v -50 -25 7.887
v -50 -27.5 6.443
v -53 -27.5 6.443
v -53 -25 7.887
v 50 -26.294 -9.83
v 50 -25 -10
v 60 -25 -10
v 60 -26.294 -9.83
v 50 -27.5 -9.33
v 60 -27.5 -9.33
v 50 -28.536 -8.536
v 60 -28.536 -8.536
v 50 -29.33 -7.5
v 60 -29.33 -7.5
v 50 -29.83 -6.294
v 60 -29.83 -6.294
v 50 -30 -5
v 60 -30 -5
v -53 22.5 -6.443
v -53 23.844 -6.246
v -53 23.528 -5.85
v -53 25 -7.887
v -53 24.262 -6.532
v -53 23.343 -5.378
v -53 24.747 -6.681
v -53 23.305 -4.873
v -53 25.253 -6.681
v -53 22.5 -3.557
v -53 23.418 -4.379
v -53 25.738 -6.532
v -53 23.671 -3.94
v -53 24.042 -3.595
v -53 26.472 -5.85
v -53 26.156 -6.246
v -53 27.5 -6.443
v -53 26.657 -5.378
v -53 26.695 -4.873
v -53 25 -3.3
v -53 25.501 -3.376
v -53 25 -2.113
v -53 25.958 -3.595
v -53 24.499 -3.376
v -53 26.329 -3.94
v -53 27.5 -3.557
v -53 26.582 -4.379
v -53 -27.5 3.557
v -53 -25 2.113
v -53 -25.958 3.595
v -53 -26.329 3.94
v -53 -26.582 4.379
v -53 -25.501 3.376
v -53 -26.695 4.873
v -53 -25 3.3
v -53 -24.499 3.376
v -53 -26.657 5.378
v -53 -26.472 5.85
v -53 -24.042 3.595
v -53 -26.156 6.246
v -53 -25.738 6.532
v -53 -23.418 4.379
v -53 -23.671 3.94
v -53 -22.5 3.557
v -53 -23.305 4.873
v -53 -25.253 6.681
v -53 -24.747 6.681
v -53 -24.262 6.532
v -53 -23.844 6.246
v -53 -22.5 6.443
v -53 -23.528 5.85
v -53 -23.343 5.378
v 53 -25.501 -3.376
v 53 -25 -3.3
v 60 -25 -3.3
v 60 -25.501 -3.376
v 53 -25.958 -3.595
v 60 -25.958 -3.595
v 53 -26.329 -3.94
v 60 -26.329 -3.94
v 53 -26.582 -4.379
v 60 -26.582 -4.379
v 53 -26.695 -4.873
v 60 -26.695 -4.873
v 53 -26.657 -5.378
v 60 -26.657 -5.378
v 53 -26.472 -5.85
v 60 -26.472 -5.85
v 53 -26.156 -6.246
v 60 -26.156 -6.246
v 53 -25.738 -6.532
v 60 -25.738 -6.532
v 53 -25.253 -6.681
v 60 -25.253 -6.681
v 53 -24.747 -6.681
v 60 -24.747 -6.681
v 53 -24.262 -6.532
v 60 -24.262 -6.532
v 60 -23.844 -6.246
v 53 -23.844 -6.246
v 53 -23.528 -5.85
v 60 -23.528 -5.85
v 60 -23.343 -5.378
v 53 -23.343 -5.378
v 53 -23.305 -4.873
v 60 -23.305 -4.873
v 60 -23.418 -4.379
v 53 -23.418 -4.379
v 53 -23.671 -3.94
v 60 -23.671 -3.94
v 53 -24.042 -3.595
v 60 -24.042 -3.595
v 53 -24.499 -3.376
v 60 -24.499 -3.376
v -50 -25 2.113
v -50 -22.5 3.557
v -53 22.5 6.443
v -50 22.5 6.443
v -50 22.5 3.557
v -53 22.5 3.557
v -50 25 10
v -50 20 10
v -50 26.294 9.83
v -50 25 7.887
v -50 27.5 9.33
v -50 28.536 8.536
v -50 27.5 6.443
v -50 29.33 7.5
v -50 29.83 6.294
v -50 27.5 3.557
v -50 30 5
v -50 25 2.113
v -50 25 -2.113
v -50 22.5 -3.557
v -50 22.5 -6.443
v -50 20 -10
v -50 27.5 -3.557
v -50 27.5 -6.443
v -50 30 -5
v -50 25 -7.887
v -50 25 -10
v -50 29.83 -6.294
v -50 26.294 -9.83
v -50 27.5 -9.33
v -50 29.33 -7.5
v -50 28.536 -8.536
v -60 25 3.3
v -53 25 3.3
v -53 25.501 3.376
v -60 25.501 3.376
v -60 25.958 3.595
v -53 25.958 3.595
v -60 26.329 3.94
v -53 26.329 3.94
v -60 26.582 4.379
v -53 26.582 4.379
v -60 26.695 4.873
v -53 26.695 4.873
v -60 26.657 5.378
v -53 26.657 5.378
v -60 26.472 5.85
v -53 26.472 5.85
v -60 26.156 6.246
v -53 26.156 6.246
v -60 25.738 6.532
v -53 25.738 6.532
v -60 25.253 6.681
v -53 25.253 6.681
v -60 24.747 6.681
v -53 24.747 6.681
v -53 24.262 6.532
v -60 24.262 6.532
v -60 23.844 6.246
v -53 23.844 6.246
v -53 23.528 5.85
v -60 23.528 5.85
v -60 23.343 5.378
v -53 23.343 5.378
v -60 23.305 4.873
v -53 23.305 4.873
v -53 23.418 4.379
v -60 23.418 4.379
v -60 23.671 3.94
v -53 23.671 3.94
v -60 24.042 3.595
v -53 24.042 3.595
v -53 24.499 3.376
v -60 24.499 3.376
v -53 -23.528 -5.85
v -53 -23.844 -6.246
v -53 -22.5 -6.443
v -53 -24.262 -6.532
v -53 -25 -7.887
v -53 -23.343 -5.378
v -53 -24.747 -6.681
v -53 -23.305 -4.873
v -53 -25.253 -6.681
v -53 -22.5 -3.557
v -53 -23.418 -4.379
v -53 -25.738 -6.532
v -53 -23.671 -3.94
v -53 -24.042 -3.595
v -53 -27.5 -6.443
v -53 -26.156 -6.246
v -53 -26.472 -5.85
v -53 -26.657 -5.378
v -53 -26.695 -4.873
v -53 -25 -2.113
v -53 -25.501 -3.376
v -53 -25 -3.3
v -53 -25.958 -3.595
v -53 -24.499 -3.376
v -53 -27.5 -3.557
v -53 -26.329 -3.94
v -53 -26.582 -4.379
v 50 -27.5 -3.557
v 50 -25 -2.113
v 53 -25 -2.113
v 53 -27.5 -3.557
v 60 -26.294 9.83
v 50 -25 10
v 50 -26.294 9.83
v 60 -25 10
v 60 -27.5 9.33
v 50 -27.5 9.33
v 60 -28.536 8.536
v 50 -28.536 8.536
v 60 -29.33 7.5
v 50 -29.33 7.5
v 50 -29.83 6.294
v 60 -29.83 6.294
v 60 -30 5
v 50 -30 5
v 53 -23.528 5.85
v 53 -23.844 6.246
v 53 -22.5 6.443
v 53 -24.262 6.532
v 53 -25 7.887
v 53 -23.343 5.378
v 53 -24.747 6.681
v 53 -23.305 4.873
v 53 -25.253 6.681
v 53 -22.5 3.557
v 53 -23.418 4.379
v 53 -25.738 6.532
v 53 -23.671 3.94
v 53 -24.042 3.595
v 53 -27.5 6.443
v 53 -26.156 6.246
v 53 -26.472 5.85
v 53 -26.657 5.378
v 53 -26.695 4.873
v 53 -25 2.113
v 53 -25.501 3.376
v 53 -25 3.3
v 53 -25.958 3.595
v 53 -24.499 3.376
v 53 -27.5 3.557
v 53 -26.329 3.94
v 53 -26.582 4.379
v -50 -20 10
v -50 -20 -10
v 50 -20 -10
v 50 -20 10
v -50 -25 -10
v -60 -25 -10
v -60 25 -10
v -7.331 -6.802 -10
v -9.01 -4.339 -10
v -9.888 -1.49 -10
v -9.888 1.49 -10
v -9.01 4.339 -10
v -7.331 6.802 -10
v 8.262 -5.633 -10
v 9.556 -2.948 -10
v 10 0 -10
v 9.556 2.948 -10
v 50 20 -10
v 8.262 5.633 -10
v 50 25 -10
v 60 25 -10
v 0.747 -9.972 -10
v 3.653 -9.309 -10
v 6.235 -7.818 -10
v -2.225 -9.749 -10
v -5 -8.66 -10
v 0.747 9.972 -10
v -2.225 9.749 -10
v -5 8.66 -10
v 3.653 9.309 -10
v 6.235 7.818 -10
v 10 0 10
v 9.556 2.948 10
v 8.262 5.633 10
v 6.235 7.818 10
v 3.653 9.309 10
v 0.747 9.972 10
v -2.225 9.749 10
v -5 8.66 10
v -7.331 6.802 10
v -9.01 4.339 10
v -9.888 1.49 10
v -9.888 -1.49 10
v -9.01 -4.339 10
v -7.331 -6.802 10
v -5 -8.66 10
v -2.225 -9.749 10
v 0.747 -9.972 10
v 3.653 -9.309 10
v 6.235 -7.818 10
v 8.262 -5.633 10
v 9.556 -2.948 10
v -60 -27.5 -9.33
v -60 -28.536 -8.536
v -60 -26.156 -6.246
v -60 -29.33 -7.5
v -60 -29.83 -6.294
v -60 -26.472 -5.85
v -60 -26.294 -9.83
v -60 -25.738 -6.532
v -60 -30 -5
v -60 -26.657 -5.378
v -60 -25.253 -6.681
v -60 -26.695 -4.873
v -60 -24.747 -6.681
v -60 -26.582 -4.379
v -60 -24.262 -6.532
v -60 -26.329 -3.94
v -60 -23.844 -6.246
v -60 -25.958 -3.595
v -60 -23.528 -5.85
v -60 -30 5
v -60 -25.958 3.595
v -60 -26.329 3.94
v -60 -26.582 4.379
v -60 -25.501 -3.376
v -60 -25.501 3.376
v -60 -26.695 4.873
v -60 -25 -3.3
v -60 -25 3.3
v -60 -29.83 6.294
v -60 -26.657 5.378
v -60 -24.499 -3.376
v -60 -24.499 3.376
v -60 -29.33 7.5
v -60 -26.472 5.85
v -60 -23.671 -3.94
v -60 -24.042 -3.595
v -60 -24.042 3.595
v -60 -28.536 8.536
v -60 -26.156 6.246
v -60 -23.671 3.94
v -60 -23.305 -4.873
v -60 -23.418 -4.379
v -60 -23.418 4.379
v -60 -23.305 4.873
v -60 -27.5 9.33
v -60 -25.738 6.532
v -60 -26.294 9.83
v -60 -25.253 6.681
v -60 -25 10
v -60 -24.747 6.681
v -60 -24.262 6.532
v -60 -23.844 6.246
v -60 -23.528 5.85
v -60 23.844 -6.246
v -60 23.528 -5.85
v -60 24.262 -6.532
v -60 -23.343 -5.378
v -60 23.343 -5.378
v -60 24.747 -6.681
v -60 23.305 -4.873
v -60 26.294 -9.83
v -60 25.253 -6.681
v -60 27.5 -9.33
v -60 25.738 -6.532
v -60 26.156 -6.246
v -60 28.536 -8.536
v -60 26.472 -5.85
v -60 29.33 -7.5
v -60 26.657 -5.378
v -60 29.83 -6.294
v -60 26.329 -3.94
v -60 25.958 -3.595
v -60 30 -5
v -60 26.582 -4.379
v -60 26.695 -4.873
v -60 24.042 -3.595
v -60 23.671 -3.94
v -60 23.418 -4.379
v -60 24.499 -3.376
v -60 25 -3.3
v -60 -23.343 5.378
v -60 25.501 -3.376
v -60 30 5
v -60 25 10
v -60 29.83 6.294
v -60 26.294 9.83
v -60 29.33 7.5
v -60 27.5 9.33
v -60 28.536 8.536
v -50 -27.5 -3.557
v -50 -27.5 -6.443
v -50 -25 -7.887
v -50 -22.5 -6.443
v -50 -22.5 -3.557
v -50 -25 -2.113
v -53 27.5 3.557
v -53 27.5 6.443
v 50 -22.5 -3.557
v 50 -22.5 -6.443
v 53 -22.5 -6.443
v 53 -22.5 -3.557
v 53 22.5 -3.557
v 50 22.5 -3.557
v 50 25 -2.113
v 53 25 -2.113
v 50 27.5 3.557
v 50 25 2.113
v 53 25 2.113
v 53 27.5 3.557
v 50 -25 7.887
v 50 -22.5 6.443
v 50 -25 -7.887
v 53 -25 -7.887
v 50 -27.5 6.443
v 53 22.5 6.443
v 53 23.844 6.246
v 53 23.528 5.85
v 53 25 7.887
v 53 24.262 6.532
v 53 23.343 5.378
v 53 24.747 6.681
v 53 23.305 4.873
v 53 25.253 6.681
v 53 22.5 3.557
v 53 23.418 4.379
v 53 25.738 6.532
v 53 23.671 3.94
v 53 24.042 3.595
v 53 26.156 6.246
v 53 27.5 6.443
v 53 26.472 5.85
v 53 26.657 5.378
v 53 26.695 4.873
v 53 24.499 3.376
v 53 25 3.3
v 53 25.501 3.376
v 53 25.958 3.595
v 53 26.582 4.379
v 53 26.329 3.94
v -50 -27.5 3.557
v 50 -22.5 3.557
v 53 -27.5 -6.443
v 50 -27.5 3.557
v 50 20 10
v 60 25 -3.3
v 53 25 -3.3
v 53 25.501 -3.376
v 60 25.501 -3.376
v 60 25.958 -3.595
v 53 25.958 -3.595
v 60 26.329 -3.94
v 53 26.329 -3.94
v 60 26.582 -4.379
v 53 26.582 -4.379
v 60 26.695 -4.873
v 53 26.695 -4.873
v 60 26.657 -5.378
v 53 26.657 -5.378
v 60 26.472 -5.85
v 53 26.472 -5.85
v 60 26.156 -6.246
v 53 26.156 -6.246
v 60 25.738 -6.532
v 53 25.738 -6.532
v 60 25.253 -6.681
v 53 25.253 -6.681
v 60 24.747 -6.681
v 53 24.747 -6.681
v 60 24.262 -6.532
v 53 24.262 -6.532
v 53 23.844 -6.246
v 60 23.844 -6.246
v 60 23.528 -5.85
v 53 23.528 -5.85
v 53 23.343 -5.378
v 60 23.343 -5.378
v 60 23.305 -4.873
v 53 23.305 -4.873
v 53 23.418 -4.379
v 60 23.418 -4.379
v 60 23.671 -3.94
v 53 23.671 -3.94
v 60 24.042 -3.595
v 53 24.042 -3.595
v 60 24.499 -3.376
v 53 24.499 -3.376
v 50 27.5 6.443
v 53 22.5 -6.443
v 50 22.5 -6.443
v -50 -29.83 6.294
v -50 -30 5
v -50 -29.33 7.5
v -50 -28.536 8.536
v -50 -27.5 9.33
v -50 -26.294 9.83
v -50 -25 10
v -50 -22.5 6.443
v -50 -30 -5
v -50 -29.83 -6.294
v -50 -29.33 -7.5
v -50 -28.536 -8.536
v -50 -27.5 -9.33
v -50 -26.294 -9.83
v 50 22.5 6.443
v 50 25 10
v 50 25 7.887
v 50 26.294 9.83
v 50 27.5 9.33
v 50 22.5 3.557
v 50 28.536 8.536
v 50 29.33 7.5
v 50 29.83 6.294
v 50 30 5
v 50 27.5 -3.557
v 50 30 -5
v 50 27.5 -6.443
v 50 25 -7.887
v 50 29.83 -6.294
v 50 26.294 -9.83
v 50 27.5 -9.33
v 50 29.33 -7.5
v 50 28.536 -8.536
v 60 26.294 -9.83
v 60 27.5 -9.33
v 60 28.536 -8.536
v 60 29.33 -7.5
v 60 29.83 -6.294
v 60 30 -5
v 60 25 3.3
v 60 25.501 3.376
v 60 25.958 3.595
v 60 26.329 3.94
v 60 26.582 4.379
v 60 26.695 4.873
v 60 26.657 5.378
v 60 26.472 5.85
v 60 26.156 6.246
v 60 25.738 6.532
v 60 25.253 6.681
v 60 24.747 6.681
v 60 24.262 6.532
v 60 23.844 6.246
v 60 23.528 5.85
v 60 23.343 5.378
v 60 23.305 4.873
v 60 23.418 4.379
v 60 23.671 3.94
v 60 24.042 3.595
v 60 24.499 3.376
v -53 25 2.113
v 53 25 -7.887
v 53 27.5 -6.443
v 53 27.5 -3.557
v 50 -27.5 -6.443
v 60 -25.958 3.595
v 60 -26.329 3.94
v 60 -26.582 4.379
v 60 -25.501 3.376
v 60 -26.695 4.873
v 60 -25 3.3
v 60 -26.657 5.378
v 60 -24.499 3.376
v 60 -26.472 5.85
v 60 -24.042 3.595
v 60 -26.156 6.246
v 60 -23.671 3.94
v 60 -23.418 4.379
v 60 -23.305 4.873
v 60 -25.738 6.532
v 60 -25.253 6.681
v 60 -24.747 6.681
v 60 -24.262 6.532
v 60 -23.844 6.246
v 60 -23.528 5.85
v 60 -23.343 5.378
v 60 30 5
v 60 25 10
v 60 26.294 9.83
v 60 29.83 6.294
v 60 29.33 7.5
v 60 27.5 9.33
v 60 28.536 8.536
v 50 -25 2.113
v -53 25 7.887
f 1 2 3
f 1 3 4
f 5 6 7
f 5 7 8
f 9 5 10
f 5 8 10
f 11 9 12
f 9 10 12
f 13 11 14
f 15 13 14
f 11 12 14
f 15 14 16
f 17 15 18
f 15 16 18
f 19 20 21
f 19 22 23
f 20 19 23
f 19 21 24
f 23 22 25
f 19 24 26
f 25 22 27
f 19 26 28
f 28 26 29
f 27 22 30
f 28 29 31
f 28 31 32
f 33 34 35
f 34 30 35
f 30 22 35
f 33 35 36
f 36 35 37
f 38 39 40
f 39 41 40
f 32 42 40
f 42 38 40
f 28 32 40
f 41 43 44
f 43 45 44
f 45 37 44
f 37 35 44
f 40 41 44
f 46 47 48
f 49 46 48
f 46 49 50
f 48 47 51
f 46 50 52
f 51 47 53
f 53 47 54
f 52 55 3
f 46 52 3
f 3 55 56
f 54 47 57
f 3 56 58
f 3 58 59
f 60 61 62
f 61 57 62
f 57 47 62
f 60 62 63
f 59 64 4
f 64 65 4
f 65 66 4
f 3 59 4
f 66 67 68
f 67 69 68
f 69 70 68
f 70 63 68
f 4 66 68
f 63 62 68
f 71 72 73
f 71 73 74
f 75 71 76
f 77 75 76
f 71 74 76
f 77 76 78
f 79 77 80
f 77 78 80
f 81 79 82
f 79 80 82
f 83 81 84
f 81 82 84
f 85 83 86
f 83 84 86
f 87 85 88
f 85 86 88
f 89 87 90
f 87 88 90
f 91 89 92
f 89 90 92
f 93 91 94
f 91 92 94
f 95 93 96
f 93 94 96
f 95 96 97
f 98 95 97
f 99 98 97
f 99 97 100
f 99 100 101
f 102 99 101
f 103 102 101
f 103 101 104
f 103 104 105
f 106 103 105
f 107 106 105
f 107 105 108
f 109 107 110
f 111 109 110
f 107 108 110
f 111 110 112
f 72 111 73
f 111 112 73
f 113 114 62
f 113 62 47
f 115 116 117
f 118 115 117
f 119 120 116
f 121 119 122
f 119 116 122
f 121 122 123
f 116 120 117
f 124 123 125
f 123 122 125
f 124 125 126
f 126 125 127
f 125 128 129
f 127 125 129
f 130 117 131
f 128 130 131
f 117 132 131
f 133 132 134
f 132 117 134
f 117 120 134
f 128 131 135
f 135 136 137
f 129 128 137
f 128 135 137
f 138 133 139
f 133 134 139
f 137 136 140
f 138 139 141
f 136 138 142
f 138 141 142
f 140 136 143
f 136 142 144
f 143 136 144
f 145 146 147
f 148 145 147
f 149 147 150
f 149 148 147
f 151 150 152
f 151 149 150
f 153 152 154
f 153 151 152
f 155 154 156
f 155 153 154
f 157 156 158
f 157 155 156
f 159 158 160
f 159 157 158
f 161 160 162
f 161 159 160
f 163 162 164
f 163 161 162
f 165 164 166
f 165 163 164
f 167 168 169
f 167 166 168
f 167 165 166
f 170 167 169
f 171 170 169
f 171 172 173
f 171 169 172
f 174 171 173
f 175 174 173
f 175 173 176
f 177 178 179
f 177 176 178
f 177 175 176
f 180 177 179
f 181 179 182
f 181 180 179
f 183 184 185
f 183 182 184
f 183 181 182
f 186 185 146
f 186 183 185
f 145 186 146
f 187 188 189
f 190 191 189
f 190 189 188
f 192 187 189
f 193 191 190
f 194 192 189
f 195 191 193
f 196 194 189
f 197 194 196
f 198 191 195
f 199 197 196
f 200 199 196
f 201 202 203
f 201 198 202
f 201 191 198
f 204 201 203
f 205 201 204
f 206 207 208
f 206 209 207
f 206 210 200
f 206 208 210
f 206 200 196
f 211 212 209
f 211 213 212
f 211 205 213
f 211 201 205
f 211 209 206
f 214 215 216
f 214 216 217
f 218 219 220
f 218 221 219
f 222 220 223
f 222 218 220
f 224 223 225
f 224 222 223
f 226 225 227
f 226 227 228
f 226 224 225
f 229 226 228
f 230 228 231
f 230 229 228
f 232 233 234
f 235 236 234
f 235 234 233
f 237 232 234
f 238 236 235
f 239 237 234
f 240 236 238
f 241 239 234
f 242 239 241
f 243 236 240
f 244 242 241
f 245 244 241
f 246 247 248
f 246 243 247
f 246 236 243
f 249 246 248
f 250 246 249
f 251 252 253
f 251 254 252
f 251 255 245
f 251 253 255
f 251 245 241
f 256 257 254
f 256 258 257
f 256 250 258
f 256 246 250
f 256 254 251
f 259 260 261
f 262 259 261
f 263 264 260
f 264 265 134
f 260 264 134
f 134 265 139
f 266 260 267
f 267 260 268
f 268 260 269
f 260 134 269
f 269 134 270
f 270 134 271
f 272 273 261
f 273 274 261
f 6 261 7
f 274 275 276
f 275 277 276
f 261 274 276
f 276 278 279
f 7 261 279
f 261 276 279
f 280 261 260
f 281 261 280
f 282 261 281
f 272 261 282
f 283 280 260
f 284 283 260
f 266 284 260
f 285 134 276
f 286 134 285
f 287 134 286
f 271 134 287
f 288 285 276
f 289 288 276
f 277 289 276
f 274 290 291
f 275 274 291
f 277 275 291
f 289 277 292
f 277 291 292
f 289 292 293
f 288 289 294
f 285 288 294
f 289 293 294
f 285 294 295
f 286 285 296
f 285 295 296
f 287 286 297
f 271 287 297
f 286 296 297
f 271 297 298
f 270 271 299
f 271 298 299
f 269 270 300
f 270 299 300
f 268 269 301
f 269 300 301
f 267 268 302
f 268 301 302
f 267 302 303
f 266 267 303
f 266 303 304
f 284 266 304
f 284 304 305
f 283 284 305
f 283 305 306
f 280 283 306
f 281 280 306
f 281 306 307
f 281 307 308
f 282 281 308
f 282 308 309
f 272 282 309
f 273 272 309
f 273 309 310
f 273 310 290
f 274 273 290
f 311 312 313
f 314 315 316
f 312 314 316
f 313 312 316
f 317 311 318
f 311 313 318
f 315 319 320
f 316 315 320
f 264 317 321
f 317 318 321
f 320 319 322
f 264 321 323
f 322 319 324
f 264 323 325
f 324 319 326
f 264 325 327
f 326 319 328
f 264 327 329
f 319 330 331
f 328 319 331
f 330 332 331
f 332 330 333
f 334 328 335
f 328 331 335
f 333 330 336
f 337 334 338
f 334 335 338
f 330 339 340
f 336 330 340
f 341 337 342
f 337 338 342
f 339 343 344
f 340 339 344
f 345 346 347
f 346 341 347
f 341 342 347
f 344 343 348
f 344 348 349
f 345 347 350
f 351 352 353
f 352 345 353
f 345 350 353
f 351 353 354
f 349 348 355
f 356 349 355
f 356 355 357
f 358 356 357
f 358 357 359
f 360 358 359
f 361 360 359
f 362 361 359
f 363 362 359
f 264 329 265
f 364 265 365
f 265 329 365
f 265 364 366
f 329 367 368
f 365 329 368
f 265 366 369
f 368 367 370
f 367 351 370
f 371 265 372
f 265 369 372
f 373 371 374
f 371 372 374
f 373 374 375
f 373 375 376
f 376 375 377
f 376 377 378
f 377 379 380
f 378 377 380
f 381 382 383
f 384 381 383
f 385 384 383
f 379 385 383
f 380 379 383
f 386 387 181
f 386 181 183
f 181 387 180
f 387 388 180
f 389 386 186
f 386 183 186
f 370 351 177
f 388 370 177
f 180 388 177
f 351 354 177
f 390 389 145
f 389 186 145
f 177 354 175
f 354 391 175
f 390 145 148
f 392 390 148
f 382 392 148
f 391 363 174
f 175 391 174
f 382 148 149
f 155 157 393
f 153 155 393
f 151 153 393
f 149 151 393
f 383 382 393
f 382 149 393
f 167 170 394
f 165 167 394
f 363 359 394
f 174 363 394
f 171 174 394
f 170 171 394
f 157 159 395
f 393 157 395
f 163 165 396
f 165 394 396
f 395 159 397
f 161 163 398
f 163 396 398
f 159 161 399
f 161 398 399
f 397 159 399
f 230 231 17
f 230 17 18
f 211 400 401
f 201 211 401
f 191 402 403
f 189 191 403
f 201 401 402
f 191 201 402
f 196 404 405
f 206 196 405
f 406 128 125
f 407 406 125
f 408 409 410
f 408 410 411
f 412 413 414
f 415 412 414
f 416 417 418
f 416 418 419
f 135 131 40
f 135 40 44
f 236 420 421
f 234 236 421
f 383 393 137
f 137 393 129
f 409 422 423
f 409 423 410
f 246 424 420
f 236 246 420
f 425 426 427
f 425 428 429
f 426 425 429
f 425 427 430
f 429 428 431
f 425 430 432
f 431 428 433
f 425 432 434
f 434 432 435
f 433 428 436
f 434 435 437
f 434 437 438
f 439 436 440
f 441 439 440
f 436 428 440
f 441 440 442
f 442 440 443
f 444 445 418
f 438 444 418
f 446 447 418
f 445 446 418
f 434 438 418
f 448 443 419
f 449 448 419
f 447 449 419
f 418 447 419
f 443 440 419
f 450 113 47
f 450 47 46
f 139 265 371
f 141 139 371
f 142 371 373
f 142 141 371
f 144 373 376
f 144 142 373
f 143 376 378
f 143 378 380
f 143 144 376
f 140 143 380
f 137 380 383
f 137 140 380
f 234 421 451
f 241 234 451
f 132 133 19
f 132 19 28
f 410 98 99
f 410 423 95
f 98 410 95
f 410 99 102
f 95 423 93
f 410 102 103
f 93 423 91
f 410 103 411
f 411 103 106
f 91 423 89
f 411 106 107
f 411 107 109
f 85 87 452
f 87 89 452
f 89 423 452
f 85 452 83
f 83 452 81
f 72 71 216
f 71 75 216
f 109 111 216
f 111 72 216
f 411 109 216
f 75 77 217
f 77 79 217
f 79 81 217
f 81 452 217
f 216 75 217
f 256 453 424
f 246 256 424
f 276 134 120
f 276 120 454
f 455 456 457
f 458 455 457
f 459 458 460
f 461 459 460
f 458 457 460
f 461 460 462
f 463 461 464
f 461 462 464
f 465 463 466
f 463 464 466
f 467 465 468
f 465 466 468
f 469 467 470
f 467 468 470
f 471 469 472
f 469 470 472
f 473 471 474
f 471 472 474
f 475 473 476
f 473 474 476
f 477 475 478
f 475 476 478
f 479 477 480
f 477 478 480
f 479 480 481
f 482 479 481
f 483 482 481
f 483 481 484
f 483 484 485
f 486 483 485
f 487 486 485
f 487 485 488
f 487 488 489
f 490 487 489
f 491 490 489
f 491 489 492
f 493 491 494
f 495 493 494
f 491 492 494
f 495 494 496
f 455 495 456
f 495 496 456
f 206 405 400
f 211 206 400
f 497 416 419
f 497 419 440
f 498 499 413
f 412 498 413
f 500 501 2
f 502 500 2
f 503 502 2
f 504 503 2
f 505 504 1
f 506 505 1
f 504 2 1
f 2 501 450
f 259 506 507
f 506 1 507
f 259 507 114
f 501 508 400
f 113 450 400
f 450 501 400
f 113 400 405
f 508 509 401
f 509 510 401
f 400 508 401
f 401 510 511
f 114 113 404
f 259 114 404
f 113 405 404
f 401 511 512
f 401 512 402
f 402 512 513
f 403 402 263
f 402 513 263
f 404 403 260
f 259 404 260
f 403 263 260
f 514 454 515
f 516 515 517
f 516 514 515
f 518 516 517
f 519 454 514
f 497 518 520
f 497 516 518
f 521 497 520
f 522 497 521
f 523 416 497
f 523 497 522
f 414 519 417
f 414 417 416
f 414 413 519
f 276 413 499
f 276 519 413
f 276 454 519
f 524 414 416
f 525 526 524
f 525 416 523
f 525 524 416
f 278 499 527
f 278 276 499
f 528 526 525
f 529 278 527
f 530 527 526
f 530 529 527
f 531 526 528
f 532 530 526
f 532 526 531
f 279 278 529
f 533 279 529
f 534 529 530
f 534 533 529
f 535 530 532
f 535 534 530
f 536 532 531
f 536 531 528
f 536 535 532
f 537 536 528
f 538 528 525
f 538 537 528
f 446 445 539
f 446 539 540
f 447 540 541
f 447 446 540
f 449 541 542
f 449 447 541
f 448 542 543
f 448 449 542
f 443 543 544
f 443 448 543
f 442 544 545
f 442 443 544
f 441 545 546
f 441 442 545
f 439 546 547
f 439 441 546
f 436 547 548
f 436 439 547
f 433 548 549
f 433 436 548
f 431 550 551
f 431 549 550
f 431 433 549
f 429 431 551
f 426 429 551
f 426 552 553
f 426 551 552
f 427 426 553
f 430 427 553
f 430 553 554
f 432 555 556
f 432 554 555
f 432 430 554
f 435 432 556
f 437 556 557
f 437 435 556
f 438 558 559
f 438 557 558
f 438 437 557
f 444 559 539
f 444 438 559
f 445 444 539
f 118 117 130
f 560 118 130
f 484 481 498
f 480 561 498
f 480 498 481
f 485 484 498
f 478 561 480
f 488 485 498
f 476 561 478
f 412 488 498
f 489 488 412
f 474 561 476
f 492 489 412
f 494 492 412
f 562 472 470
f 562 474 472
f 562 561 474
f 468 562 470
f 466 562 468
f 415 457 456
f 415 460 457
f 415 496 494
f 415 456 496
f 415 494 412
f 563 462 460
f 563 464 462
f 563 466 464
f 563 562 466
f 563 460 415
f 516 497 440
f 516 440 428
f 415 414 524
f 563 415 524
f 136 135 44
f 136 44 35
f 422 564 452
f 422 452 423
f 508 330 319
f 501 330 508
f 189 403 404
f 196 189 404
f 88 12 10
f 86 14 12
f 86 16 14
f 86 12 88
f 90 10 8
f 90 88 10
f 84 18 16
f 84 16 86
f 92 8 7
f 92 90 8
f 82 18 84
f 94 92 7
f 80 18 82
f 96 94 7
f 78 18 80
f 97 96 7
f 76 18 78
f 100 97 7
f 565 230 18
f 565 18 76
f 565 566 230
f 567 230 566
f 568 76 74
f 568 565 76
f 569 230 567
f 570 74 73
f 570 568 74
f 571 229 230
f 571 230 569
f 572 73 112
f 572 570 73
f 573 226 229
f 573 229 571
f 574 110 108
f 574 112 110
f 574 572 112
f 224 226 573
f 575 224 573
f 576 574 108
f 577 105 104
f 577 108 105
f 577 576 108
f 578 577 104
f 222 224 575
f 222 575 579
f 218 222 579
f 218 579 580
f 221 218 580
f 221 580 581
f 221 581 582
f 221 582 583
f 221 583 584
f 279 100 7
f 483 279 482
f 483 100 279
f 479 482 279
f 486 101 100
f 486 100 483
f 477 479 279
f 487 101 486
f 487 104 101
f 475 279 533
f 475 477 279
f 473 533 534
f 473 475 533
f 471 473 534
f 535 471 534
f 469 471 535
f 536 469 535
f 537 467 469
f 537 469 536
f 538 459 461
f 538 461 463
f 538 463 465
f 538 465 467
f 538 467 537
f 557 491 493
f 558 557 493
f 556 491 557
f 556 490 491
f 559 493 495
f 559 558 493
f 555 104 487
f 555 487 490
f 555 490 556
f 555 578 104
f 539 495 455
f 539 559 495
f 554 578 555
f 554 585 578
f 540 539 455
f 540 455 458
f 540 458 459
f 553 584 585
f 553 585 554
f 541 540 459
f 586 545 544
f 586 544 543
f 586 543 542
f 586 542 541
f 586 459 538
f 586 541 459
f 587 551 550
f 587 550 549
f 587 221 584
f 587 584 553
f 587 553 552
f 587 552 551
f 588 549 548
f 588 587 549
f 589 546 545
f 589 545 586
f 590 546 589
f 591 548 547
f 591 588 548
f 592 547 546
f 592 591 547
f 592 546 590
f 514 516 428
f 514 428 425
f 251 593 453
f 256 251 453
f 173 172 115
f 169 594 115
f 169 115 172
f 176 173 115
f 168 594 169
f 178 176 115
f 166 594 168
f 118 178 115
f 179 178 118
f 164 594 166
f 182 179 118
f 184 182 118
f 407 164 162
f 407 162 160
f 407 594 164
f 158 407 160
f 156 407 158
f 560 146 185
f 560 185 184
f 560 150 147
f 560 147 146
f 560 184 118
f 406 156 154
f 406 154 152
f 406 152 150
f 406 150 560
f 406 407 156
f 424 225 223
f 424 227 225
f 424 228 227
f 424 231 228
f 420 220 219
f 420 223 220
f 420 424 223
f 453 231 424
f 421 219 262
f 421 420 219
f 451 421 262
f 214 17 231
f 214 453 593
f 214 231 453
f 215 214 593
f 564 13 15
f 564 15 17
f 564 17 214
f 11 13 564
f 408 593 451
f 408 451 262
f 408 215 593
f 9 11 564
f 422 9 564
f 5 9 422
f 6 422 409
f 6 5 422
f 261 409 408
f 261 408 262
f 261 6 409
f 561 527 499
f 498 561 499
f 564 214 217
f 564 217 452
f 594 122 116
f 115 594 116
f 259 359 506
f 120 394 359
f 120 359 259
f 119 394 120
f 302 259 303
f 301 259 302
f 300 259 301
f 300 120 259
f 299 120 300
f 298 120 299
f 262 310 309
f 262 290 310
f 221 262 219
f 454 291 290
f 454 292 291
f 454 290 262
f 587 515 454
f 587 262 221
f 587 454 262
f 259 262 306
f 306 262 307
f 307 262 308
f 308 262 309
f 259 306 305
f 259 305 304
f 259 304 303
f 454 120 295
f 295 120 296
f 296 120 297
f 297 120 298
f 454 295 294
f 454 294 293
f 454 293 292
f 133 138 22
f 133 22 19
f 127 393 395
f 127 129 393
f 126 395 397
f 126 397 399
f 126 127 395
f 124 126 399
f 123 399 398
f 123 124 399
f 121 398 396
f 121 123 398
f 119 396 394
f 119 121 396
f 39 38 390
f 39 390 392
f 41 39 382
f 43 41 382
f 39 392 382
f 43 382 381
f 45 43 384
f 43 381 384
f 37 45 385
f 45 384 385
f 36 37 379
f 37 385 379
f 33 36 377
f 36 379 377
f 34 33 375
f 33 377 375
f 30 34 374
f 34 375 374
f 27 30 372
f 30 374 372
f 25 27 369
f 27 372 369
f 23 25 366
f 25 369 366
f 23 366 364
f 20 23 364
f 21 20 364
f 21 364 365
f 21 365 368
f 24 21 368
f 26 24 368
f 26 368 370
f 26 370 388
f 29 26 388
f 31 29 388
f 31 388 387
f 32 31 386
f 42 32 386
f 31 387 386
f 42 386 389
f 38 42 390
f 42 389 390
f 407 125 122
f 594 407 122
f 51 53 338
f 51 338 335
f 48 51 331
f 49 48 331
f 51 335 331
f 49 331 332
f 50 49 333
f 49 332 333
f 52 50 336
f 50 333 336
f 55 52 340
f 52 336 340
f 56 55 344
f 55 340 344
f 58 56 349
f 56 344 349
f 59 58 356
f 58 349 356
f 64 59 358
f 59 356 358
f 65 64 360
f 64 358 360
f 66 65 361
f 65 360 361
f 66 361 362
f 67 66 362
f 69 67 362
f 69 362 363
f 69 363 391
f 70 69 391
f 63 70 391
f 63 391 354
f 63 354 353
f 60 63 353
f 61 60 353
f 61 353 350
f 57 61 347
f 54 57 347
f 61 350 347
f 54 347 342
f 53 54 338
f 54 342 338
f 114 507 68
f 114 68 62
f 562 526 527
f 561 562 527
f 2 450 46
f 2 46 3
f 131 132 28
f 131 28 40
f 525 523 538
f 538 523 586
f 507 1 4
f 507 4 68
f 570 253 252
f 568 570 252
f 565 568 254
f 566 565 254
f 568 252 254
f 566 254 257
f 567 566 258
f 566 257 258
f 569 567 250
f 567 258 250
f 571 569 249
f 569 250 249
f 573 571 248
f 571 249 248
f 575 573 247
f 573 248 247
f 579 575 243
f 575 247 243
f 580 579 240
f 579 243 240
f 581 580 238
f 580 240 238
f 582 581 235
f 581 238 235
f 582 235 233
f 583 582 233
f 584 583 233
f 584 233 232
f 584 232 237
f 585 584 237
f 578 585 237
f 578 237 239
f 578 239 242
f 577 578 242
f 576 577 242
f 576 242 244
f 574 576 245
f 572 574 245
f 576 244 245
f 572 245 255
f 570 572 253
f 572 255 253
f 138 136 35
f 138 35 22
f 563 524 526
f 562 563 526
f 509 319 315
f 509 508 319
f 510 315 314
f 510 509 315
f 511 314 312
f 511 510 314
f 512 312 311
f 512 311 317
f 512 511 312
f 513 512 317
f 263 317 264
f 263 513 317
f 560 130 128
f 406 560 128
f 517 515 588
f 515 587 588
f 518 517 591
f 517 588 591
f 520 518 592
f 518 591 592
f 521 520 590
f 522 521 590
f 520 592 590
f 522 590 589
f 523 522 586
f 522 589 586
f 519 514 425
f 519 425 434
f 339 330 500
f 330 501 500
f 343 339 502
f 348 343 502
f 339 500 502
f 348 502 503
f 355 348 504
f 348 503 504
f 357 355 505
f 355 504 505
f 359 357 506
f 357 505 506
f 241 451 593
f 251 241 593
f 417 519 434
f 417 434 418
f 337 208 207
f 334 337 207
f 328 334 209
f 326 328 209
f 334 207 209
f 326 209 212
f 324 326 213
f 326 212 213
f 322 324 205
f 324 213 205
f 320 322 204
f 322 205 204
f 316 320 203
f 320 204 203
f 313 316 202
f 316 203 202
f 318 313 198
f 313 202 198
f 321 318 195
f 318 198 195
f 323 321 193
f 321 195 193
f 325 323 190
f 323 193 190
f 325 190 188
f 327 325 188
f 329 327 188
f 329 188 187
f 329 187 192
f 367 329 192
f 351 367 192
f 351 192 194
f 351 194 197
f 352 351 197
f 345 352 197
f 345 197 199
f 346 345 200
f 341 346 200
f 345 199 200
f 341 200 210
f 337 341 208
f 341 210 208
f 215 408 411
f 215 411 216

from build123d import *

# Parameters (mm, degrees)
SKETCH1_W                                  = 120
SKETCH1_H                                  = 60
BOSS_EXTRUDE1_DEPTH                        = 10
CUT_EXTRUDE1_DEPTH                         = 71
CUT_EXTRUDE1_DEPTH_BACK                    = 71
SKETCH2_W                                  = 100
SKETCH2_H                                  = 10
FILLET1_R                                  = 5
SKETCH4_R                                  = 1.7
CUT_EXTRUDE3_DEPTH                         = 115.455231423
CUT_EXTRUDE4_DEPTH                         = 3
MIRROR1_AT_THE_SECOND_PLANE_COPY_1_SKETC_R = 1.7
MIRROR1_AT_THE_SECOND_PLANE_COPY_1_DEPTH   = 115.455231423
MIRROR1_AT_THE_SECOND_PLANE_COPY_2_DEPTH   = 3
MIRROR2_COPY_1_SKETCH_R                    = 1.7
MIRROR2_COPY_1_DEPTH                       = 115.455231423
MIRROR2_COPY_2_DEPTH                       = 3
MIRROR2_COPY_3_SKETCH_R                    = 1.7
MIRROR2_COPY_3_DEPTH                       = 115.455231423
MIRROR2_COPY_4_DEPTH                       = 3
MIRROR2_COPY_5_SKETCH_R                    = 1.7
MIRROR2_COPY_5_DEPTH                       = 115.455231423
MIRROR2_COPY_6_DEPTH                       = 3
MIRROR2_COPY_7_SKETCH_R                    = 1.7
MIRROR2_COPY_7_DEPTH                       = 115.455231423
SKETCH6_R                                  = 10
CUT_EXTRUDE5_DEPTH                         = 71


with BuildPart() as part:
    # Sketch1 → Boss-Extrude1 (new, symmetric)
    with BuildSketch(Plane.XY):
        Rectangle(SKETCH1_W, SKETCH1_H)
    extrude(amount=BOSS_EXTRUDE1_DEPTH, both=True)

    # Sketch2 → Cut-Extrude1 (cut, two sides: drawn at the far end of the back side and taken through both)
    with BuildSketch(Plane.XY.offset(10).offset(-CUT_EXTRUDE1_DEPTH_BACK)):
        with Locations((0, -25)):
            Rectangle(SKETCH2_W, SKETCH2_H)
        with Locations((0, 25)):
            Rectangle(SKETCH2_W, SKETCH2_H)
    extrude(amount=CUT_EXTRUDE1_DEPTH + CUT_EXTRUDE1_DEPTH_BACK, mode=Mode.SUBTRACT)

    # Fillet1
    fillet1_edges = [part.edges().sort_by_distance(p)[0] for p in [
        (55, -30, -10),
        (-55, 30, -10),
        (-55, -30, 10),
        (-55, 30, 10),
        (55, -30, 10),
        (-55, -30, -10),
        (55, 30, -10),
        (55, 30, 10),
    ]]
    fillet(fillet1_edges, radius=FILLET1_R)

    # Sketch4 → Cut-Extrude3 (cut, symmetric)
    with BuildSketch(Plane.ZY.offset(-50)):
        with Locations((-5, 25)):
            Circle(SKETCH4_R)
    cut_extrude3 = extrude(amount=CUT_EXTRUDE3_DEPTH, both=True, mode=Mode.SUBTRACT)

    # Sketch5 → Cut-Extrude4 (cut)
    with BuildSketch(Plane.ZY.offset(-50)):
        Polygon((-7.886751346, 25), (-6.443375673, 22.5), (-3.556624327, 22.5), (-2.113248654, 25), (-3.556624327, 27.5), (-6.443375673, 27.5), align=None)
    cut_extrude4 = extrude(amount=-CUT_EXTRUDE4_DEPTH, mode=Mode.SUBTRACT)

    # Mirror1: Cut-Extrude3, Cut-Extrude4 across plane
    add(cut_extrude3.mirror(Plane(origin=(0, 0, 0), x_dir=(0, 0, 1), z_dir=(1, 0, 0))), mode=Mode.SUBTRACT)
    add(cut_extrude4.mirror(Plane(origin=(0, 0, 0), x_dir=(0, 0, 1), z_dir=(1, 0, 0))), mode=Mode.SUBTRACT)

    # Mirror1 at the second plane: Cut-Extrude3, Cut-Extrude4 across plane
    add(cut_extrude3.mirror(Plane.XY), mode=Mode.SUBTRACT)
    add(cut_extrude4.mirror(Plane.XY), mode=Mode.SUBTRACT)

    # Mirror1 at the second plane copy 1 sketc → Mirror1 at the second plane copy 1 (cut, symmetric)
    with BuildSketch(Plane(origin=(-50, 0, 0), x_dir=(0, 0, -1), z_dir=(1, 0, 0))):
        with Locations((-5, 25)):
            Circle(MIRROR1_AT_THE_SECOND_PLANE_COPY_1_SKETC_R)
    extrude(amount=MIRROR1_AT_THE_SECOND_PLANE_COPY_1_DEPTH, both=True, mode=Mode.SUBTRACT)

    # Mirror1 at the second plane copy 2 sketc → Mirror1 at the second plane copy 2 (cut)
    with BuildSketch(Plane(origin=(-50, 0, 0), x_dir=(0, 0, -1), z_dir=(1, 0, 0))):
        Polygon((-7.886751346, 25), (-6.443375673, 22.5), (-3.556624327, 22.5), (-2.113248654, 25), (-3.556624327, 27.5), (-6.443375673, 27.5), align=None)
    extrude(amount=-MIRROR1_AT_THE_SECOND_PLANE_COPY_2_DEPTH, mode=Mode.SUBTRACT)

    # Mirror2: Cut-Extrude4 across plane
    add(cut_extrude4.mirror(Plane.ZX), mode=Mode.SUBTRACT)

    # Mirror2 copy 1 sketch → Mirror2 copy 1 (cut, symmetric)
    with BuildSketch(Plane(origin=(-50, 0, 0), x_dir=(0, 0, 1), z_dir=(1, 0, 0))):
        with Locations((-5, 25)):
            Circle(MIRROR2_COPY_1_SKETCH_R)
    extrude(amount=MIRROR2_COPY_1_DEPTH, both=True, mode=Mode.SUBTRACT)

    # Mirror2 copy 2 sketch → Mirror2 copy 2 (cut)
    with BuildSketch(Plane(origin=(-50, 0, 0), x_dir=(0, 0, 1), z_dir=(1, 0, 0))):
        Polygon((-7.886751346, 25), (-6.443375673, 22.5), (-3.556624327, 22.5), (-2.113248654, 25), (-3.556624327, 27.5), (-6.443375673, 27.5), align=None)
    extrude(amount=-MIRROR2_COPY_2_DEPTH, mode=Mode.SUBTRACT)

    # Mirror2 copy 3 sketch → Mirror2 copy 3 (cut, symmetric)
    with BuildSketch(Plane(origin=(50, 0, 0), x_dir=(0, 0, -1), z_dir=(-1, 0, 0))):
        with Locations((-5, 25)):
            Circle(MIRROR2_COPY_3_SKETCH_R)
    extrude(amount=MIRROR2_COPY_3_DEPTH, both=True, mode=Mode.SUBTRACT)

    # Mirror2 copy 4 sketch → Mirror2 copy 4 (cut)
    with BuildSketch(Plane(origin=(50, 0, 0), x_dir=(0, 0, -1), z_dir=(-1, 0, 0))):
        Polygon((-7.886751346, 25), (-6.443375673, 22.5), (-3.556624327, 22.5), (-2.113248654, 25), (-3.556624327, 27.5), (-6.443375673, 27.5), align=None)
    extrude(amount=-MIRROR2_COPY_4_DEPTH, mode=Mode.SUBTRACT)

    # Mirror2 copy 5 sketch → Mirror2 copy 5 (cut, symmetric)
    with BuildSketch(Plane(origin=(-50, 0, 0), x_dir=(0, 0, -1), z_dir=(1, 0, 0))):
        with Locations((-5, -25)):
            Circle(MIRROR2_COPY_5_SKETCH_R)
    extrude(amount=MIRROR2_COPY_5_DEPTH, both=True, mode=Mode.SUBTRACT)

    # Mirror2 copy 6 sketch → Mirror2 copy 6 (cut)
    with BuildSketch(Plane(origin=(-50, 0, 0), x_dir=(0, 0, -1), z_dir=(1, 0, 0))):
        Polygon((-7.886751346, -25), (-6.443375673, -22.5), (-3.556624327, -22.5), (-2.113248654, -25), (-3.556624327, -27.5), (-6.443375673, -27.5), align=None)
    extrude(amount=-MIRROR2_COPY_6_DEPTH, mode=Mode.SUBTRACT)

    # Mirror2 copy 7 sketch → Mirror2 copy 7 (cut, symmetric)
    with BuildSketch(Plane.ZY.offset(-50)):
        with Locations((-5, -25)):
            Circle(MIRROR2_COPY_7_SKETCH_R)
    extrude(amount=MIRROR2_COPY_7_DEPTH, both=True, mode=Mode.SUBTRACT)

    # Sketch6 → Cut-Extrude5 (cut, through all)
    with BuildSketch(Plane.XY.offset(10)):
        Circle(SKETCH6_R)
    extrude(amount=-CUT_EXTRUDE5_DEPTH, mode=Mode.SUBTRACT)


solid = part.part
